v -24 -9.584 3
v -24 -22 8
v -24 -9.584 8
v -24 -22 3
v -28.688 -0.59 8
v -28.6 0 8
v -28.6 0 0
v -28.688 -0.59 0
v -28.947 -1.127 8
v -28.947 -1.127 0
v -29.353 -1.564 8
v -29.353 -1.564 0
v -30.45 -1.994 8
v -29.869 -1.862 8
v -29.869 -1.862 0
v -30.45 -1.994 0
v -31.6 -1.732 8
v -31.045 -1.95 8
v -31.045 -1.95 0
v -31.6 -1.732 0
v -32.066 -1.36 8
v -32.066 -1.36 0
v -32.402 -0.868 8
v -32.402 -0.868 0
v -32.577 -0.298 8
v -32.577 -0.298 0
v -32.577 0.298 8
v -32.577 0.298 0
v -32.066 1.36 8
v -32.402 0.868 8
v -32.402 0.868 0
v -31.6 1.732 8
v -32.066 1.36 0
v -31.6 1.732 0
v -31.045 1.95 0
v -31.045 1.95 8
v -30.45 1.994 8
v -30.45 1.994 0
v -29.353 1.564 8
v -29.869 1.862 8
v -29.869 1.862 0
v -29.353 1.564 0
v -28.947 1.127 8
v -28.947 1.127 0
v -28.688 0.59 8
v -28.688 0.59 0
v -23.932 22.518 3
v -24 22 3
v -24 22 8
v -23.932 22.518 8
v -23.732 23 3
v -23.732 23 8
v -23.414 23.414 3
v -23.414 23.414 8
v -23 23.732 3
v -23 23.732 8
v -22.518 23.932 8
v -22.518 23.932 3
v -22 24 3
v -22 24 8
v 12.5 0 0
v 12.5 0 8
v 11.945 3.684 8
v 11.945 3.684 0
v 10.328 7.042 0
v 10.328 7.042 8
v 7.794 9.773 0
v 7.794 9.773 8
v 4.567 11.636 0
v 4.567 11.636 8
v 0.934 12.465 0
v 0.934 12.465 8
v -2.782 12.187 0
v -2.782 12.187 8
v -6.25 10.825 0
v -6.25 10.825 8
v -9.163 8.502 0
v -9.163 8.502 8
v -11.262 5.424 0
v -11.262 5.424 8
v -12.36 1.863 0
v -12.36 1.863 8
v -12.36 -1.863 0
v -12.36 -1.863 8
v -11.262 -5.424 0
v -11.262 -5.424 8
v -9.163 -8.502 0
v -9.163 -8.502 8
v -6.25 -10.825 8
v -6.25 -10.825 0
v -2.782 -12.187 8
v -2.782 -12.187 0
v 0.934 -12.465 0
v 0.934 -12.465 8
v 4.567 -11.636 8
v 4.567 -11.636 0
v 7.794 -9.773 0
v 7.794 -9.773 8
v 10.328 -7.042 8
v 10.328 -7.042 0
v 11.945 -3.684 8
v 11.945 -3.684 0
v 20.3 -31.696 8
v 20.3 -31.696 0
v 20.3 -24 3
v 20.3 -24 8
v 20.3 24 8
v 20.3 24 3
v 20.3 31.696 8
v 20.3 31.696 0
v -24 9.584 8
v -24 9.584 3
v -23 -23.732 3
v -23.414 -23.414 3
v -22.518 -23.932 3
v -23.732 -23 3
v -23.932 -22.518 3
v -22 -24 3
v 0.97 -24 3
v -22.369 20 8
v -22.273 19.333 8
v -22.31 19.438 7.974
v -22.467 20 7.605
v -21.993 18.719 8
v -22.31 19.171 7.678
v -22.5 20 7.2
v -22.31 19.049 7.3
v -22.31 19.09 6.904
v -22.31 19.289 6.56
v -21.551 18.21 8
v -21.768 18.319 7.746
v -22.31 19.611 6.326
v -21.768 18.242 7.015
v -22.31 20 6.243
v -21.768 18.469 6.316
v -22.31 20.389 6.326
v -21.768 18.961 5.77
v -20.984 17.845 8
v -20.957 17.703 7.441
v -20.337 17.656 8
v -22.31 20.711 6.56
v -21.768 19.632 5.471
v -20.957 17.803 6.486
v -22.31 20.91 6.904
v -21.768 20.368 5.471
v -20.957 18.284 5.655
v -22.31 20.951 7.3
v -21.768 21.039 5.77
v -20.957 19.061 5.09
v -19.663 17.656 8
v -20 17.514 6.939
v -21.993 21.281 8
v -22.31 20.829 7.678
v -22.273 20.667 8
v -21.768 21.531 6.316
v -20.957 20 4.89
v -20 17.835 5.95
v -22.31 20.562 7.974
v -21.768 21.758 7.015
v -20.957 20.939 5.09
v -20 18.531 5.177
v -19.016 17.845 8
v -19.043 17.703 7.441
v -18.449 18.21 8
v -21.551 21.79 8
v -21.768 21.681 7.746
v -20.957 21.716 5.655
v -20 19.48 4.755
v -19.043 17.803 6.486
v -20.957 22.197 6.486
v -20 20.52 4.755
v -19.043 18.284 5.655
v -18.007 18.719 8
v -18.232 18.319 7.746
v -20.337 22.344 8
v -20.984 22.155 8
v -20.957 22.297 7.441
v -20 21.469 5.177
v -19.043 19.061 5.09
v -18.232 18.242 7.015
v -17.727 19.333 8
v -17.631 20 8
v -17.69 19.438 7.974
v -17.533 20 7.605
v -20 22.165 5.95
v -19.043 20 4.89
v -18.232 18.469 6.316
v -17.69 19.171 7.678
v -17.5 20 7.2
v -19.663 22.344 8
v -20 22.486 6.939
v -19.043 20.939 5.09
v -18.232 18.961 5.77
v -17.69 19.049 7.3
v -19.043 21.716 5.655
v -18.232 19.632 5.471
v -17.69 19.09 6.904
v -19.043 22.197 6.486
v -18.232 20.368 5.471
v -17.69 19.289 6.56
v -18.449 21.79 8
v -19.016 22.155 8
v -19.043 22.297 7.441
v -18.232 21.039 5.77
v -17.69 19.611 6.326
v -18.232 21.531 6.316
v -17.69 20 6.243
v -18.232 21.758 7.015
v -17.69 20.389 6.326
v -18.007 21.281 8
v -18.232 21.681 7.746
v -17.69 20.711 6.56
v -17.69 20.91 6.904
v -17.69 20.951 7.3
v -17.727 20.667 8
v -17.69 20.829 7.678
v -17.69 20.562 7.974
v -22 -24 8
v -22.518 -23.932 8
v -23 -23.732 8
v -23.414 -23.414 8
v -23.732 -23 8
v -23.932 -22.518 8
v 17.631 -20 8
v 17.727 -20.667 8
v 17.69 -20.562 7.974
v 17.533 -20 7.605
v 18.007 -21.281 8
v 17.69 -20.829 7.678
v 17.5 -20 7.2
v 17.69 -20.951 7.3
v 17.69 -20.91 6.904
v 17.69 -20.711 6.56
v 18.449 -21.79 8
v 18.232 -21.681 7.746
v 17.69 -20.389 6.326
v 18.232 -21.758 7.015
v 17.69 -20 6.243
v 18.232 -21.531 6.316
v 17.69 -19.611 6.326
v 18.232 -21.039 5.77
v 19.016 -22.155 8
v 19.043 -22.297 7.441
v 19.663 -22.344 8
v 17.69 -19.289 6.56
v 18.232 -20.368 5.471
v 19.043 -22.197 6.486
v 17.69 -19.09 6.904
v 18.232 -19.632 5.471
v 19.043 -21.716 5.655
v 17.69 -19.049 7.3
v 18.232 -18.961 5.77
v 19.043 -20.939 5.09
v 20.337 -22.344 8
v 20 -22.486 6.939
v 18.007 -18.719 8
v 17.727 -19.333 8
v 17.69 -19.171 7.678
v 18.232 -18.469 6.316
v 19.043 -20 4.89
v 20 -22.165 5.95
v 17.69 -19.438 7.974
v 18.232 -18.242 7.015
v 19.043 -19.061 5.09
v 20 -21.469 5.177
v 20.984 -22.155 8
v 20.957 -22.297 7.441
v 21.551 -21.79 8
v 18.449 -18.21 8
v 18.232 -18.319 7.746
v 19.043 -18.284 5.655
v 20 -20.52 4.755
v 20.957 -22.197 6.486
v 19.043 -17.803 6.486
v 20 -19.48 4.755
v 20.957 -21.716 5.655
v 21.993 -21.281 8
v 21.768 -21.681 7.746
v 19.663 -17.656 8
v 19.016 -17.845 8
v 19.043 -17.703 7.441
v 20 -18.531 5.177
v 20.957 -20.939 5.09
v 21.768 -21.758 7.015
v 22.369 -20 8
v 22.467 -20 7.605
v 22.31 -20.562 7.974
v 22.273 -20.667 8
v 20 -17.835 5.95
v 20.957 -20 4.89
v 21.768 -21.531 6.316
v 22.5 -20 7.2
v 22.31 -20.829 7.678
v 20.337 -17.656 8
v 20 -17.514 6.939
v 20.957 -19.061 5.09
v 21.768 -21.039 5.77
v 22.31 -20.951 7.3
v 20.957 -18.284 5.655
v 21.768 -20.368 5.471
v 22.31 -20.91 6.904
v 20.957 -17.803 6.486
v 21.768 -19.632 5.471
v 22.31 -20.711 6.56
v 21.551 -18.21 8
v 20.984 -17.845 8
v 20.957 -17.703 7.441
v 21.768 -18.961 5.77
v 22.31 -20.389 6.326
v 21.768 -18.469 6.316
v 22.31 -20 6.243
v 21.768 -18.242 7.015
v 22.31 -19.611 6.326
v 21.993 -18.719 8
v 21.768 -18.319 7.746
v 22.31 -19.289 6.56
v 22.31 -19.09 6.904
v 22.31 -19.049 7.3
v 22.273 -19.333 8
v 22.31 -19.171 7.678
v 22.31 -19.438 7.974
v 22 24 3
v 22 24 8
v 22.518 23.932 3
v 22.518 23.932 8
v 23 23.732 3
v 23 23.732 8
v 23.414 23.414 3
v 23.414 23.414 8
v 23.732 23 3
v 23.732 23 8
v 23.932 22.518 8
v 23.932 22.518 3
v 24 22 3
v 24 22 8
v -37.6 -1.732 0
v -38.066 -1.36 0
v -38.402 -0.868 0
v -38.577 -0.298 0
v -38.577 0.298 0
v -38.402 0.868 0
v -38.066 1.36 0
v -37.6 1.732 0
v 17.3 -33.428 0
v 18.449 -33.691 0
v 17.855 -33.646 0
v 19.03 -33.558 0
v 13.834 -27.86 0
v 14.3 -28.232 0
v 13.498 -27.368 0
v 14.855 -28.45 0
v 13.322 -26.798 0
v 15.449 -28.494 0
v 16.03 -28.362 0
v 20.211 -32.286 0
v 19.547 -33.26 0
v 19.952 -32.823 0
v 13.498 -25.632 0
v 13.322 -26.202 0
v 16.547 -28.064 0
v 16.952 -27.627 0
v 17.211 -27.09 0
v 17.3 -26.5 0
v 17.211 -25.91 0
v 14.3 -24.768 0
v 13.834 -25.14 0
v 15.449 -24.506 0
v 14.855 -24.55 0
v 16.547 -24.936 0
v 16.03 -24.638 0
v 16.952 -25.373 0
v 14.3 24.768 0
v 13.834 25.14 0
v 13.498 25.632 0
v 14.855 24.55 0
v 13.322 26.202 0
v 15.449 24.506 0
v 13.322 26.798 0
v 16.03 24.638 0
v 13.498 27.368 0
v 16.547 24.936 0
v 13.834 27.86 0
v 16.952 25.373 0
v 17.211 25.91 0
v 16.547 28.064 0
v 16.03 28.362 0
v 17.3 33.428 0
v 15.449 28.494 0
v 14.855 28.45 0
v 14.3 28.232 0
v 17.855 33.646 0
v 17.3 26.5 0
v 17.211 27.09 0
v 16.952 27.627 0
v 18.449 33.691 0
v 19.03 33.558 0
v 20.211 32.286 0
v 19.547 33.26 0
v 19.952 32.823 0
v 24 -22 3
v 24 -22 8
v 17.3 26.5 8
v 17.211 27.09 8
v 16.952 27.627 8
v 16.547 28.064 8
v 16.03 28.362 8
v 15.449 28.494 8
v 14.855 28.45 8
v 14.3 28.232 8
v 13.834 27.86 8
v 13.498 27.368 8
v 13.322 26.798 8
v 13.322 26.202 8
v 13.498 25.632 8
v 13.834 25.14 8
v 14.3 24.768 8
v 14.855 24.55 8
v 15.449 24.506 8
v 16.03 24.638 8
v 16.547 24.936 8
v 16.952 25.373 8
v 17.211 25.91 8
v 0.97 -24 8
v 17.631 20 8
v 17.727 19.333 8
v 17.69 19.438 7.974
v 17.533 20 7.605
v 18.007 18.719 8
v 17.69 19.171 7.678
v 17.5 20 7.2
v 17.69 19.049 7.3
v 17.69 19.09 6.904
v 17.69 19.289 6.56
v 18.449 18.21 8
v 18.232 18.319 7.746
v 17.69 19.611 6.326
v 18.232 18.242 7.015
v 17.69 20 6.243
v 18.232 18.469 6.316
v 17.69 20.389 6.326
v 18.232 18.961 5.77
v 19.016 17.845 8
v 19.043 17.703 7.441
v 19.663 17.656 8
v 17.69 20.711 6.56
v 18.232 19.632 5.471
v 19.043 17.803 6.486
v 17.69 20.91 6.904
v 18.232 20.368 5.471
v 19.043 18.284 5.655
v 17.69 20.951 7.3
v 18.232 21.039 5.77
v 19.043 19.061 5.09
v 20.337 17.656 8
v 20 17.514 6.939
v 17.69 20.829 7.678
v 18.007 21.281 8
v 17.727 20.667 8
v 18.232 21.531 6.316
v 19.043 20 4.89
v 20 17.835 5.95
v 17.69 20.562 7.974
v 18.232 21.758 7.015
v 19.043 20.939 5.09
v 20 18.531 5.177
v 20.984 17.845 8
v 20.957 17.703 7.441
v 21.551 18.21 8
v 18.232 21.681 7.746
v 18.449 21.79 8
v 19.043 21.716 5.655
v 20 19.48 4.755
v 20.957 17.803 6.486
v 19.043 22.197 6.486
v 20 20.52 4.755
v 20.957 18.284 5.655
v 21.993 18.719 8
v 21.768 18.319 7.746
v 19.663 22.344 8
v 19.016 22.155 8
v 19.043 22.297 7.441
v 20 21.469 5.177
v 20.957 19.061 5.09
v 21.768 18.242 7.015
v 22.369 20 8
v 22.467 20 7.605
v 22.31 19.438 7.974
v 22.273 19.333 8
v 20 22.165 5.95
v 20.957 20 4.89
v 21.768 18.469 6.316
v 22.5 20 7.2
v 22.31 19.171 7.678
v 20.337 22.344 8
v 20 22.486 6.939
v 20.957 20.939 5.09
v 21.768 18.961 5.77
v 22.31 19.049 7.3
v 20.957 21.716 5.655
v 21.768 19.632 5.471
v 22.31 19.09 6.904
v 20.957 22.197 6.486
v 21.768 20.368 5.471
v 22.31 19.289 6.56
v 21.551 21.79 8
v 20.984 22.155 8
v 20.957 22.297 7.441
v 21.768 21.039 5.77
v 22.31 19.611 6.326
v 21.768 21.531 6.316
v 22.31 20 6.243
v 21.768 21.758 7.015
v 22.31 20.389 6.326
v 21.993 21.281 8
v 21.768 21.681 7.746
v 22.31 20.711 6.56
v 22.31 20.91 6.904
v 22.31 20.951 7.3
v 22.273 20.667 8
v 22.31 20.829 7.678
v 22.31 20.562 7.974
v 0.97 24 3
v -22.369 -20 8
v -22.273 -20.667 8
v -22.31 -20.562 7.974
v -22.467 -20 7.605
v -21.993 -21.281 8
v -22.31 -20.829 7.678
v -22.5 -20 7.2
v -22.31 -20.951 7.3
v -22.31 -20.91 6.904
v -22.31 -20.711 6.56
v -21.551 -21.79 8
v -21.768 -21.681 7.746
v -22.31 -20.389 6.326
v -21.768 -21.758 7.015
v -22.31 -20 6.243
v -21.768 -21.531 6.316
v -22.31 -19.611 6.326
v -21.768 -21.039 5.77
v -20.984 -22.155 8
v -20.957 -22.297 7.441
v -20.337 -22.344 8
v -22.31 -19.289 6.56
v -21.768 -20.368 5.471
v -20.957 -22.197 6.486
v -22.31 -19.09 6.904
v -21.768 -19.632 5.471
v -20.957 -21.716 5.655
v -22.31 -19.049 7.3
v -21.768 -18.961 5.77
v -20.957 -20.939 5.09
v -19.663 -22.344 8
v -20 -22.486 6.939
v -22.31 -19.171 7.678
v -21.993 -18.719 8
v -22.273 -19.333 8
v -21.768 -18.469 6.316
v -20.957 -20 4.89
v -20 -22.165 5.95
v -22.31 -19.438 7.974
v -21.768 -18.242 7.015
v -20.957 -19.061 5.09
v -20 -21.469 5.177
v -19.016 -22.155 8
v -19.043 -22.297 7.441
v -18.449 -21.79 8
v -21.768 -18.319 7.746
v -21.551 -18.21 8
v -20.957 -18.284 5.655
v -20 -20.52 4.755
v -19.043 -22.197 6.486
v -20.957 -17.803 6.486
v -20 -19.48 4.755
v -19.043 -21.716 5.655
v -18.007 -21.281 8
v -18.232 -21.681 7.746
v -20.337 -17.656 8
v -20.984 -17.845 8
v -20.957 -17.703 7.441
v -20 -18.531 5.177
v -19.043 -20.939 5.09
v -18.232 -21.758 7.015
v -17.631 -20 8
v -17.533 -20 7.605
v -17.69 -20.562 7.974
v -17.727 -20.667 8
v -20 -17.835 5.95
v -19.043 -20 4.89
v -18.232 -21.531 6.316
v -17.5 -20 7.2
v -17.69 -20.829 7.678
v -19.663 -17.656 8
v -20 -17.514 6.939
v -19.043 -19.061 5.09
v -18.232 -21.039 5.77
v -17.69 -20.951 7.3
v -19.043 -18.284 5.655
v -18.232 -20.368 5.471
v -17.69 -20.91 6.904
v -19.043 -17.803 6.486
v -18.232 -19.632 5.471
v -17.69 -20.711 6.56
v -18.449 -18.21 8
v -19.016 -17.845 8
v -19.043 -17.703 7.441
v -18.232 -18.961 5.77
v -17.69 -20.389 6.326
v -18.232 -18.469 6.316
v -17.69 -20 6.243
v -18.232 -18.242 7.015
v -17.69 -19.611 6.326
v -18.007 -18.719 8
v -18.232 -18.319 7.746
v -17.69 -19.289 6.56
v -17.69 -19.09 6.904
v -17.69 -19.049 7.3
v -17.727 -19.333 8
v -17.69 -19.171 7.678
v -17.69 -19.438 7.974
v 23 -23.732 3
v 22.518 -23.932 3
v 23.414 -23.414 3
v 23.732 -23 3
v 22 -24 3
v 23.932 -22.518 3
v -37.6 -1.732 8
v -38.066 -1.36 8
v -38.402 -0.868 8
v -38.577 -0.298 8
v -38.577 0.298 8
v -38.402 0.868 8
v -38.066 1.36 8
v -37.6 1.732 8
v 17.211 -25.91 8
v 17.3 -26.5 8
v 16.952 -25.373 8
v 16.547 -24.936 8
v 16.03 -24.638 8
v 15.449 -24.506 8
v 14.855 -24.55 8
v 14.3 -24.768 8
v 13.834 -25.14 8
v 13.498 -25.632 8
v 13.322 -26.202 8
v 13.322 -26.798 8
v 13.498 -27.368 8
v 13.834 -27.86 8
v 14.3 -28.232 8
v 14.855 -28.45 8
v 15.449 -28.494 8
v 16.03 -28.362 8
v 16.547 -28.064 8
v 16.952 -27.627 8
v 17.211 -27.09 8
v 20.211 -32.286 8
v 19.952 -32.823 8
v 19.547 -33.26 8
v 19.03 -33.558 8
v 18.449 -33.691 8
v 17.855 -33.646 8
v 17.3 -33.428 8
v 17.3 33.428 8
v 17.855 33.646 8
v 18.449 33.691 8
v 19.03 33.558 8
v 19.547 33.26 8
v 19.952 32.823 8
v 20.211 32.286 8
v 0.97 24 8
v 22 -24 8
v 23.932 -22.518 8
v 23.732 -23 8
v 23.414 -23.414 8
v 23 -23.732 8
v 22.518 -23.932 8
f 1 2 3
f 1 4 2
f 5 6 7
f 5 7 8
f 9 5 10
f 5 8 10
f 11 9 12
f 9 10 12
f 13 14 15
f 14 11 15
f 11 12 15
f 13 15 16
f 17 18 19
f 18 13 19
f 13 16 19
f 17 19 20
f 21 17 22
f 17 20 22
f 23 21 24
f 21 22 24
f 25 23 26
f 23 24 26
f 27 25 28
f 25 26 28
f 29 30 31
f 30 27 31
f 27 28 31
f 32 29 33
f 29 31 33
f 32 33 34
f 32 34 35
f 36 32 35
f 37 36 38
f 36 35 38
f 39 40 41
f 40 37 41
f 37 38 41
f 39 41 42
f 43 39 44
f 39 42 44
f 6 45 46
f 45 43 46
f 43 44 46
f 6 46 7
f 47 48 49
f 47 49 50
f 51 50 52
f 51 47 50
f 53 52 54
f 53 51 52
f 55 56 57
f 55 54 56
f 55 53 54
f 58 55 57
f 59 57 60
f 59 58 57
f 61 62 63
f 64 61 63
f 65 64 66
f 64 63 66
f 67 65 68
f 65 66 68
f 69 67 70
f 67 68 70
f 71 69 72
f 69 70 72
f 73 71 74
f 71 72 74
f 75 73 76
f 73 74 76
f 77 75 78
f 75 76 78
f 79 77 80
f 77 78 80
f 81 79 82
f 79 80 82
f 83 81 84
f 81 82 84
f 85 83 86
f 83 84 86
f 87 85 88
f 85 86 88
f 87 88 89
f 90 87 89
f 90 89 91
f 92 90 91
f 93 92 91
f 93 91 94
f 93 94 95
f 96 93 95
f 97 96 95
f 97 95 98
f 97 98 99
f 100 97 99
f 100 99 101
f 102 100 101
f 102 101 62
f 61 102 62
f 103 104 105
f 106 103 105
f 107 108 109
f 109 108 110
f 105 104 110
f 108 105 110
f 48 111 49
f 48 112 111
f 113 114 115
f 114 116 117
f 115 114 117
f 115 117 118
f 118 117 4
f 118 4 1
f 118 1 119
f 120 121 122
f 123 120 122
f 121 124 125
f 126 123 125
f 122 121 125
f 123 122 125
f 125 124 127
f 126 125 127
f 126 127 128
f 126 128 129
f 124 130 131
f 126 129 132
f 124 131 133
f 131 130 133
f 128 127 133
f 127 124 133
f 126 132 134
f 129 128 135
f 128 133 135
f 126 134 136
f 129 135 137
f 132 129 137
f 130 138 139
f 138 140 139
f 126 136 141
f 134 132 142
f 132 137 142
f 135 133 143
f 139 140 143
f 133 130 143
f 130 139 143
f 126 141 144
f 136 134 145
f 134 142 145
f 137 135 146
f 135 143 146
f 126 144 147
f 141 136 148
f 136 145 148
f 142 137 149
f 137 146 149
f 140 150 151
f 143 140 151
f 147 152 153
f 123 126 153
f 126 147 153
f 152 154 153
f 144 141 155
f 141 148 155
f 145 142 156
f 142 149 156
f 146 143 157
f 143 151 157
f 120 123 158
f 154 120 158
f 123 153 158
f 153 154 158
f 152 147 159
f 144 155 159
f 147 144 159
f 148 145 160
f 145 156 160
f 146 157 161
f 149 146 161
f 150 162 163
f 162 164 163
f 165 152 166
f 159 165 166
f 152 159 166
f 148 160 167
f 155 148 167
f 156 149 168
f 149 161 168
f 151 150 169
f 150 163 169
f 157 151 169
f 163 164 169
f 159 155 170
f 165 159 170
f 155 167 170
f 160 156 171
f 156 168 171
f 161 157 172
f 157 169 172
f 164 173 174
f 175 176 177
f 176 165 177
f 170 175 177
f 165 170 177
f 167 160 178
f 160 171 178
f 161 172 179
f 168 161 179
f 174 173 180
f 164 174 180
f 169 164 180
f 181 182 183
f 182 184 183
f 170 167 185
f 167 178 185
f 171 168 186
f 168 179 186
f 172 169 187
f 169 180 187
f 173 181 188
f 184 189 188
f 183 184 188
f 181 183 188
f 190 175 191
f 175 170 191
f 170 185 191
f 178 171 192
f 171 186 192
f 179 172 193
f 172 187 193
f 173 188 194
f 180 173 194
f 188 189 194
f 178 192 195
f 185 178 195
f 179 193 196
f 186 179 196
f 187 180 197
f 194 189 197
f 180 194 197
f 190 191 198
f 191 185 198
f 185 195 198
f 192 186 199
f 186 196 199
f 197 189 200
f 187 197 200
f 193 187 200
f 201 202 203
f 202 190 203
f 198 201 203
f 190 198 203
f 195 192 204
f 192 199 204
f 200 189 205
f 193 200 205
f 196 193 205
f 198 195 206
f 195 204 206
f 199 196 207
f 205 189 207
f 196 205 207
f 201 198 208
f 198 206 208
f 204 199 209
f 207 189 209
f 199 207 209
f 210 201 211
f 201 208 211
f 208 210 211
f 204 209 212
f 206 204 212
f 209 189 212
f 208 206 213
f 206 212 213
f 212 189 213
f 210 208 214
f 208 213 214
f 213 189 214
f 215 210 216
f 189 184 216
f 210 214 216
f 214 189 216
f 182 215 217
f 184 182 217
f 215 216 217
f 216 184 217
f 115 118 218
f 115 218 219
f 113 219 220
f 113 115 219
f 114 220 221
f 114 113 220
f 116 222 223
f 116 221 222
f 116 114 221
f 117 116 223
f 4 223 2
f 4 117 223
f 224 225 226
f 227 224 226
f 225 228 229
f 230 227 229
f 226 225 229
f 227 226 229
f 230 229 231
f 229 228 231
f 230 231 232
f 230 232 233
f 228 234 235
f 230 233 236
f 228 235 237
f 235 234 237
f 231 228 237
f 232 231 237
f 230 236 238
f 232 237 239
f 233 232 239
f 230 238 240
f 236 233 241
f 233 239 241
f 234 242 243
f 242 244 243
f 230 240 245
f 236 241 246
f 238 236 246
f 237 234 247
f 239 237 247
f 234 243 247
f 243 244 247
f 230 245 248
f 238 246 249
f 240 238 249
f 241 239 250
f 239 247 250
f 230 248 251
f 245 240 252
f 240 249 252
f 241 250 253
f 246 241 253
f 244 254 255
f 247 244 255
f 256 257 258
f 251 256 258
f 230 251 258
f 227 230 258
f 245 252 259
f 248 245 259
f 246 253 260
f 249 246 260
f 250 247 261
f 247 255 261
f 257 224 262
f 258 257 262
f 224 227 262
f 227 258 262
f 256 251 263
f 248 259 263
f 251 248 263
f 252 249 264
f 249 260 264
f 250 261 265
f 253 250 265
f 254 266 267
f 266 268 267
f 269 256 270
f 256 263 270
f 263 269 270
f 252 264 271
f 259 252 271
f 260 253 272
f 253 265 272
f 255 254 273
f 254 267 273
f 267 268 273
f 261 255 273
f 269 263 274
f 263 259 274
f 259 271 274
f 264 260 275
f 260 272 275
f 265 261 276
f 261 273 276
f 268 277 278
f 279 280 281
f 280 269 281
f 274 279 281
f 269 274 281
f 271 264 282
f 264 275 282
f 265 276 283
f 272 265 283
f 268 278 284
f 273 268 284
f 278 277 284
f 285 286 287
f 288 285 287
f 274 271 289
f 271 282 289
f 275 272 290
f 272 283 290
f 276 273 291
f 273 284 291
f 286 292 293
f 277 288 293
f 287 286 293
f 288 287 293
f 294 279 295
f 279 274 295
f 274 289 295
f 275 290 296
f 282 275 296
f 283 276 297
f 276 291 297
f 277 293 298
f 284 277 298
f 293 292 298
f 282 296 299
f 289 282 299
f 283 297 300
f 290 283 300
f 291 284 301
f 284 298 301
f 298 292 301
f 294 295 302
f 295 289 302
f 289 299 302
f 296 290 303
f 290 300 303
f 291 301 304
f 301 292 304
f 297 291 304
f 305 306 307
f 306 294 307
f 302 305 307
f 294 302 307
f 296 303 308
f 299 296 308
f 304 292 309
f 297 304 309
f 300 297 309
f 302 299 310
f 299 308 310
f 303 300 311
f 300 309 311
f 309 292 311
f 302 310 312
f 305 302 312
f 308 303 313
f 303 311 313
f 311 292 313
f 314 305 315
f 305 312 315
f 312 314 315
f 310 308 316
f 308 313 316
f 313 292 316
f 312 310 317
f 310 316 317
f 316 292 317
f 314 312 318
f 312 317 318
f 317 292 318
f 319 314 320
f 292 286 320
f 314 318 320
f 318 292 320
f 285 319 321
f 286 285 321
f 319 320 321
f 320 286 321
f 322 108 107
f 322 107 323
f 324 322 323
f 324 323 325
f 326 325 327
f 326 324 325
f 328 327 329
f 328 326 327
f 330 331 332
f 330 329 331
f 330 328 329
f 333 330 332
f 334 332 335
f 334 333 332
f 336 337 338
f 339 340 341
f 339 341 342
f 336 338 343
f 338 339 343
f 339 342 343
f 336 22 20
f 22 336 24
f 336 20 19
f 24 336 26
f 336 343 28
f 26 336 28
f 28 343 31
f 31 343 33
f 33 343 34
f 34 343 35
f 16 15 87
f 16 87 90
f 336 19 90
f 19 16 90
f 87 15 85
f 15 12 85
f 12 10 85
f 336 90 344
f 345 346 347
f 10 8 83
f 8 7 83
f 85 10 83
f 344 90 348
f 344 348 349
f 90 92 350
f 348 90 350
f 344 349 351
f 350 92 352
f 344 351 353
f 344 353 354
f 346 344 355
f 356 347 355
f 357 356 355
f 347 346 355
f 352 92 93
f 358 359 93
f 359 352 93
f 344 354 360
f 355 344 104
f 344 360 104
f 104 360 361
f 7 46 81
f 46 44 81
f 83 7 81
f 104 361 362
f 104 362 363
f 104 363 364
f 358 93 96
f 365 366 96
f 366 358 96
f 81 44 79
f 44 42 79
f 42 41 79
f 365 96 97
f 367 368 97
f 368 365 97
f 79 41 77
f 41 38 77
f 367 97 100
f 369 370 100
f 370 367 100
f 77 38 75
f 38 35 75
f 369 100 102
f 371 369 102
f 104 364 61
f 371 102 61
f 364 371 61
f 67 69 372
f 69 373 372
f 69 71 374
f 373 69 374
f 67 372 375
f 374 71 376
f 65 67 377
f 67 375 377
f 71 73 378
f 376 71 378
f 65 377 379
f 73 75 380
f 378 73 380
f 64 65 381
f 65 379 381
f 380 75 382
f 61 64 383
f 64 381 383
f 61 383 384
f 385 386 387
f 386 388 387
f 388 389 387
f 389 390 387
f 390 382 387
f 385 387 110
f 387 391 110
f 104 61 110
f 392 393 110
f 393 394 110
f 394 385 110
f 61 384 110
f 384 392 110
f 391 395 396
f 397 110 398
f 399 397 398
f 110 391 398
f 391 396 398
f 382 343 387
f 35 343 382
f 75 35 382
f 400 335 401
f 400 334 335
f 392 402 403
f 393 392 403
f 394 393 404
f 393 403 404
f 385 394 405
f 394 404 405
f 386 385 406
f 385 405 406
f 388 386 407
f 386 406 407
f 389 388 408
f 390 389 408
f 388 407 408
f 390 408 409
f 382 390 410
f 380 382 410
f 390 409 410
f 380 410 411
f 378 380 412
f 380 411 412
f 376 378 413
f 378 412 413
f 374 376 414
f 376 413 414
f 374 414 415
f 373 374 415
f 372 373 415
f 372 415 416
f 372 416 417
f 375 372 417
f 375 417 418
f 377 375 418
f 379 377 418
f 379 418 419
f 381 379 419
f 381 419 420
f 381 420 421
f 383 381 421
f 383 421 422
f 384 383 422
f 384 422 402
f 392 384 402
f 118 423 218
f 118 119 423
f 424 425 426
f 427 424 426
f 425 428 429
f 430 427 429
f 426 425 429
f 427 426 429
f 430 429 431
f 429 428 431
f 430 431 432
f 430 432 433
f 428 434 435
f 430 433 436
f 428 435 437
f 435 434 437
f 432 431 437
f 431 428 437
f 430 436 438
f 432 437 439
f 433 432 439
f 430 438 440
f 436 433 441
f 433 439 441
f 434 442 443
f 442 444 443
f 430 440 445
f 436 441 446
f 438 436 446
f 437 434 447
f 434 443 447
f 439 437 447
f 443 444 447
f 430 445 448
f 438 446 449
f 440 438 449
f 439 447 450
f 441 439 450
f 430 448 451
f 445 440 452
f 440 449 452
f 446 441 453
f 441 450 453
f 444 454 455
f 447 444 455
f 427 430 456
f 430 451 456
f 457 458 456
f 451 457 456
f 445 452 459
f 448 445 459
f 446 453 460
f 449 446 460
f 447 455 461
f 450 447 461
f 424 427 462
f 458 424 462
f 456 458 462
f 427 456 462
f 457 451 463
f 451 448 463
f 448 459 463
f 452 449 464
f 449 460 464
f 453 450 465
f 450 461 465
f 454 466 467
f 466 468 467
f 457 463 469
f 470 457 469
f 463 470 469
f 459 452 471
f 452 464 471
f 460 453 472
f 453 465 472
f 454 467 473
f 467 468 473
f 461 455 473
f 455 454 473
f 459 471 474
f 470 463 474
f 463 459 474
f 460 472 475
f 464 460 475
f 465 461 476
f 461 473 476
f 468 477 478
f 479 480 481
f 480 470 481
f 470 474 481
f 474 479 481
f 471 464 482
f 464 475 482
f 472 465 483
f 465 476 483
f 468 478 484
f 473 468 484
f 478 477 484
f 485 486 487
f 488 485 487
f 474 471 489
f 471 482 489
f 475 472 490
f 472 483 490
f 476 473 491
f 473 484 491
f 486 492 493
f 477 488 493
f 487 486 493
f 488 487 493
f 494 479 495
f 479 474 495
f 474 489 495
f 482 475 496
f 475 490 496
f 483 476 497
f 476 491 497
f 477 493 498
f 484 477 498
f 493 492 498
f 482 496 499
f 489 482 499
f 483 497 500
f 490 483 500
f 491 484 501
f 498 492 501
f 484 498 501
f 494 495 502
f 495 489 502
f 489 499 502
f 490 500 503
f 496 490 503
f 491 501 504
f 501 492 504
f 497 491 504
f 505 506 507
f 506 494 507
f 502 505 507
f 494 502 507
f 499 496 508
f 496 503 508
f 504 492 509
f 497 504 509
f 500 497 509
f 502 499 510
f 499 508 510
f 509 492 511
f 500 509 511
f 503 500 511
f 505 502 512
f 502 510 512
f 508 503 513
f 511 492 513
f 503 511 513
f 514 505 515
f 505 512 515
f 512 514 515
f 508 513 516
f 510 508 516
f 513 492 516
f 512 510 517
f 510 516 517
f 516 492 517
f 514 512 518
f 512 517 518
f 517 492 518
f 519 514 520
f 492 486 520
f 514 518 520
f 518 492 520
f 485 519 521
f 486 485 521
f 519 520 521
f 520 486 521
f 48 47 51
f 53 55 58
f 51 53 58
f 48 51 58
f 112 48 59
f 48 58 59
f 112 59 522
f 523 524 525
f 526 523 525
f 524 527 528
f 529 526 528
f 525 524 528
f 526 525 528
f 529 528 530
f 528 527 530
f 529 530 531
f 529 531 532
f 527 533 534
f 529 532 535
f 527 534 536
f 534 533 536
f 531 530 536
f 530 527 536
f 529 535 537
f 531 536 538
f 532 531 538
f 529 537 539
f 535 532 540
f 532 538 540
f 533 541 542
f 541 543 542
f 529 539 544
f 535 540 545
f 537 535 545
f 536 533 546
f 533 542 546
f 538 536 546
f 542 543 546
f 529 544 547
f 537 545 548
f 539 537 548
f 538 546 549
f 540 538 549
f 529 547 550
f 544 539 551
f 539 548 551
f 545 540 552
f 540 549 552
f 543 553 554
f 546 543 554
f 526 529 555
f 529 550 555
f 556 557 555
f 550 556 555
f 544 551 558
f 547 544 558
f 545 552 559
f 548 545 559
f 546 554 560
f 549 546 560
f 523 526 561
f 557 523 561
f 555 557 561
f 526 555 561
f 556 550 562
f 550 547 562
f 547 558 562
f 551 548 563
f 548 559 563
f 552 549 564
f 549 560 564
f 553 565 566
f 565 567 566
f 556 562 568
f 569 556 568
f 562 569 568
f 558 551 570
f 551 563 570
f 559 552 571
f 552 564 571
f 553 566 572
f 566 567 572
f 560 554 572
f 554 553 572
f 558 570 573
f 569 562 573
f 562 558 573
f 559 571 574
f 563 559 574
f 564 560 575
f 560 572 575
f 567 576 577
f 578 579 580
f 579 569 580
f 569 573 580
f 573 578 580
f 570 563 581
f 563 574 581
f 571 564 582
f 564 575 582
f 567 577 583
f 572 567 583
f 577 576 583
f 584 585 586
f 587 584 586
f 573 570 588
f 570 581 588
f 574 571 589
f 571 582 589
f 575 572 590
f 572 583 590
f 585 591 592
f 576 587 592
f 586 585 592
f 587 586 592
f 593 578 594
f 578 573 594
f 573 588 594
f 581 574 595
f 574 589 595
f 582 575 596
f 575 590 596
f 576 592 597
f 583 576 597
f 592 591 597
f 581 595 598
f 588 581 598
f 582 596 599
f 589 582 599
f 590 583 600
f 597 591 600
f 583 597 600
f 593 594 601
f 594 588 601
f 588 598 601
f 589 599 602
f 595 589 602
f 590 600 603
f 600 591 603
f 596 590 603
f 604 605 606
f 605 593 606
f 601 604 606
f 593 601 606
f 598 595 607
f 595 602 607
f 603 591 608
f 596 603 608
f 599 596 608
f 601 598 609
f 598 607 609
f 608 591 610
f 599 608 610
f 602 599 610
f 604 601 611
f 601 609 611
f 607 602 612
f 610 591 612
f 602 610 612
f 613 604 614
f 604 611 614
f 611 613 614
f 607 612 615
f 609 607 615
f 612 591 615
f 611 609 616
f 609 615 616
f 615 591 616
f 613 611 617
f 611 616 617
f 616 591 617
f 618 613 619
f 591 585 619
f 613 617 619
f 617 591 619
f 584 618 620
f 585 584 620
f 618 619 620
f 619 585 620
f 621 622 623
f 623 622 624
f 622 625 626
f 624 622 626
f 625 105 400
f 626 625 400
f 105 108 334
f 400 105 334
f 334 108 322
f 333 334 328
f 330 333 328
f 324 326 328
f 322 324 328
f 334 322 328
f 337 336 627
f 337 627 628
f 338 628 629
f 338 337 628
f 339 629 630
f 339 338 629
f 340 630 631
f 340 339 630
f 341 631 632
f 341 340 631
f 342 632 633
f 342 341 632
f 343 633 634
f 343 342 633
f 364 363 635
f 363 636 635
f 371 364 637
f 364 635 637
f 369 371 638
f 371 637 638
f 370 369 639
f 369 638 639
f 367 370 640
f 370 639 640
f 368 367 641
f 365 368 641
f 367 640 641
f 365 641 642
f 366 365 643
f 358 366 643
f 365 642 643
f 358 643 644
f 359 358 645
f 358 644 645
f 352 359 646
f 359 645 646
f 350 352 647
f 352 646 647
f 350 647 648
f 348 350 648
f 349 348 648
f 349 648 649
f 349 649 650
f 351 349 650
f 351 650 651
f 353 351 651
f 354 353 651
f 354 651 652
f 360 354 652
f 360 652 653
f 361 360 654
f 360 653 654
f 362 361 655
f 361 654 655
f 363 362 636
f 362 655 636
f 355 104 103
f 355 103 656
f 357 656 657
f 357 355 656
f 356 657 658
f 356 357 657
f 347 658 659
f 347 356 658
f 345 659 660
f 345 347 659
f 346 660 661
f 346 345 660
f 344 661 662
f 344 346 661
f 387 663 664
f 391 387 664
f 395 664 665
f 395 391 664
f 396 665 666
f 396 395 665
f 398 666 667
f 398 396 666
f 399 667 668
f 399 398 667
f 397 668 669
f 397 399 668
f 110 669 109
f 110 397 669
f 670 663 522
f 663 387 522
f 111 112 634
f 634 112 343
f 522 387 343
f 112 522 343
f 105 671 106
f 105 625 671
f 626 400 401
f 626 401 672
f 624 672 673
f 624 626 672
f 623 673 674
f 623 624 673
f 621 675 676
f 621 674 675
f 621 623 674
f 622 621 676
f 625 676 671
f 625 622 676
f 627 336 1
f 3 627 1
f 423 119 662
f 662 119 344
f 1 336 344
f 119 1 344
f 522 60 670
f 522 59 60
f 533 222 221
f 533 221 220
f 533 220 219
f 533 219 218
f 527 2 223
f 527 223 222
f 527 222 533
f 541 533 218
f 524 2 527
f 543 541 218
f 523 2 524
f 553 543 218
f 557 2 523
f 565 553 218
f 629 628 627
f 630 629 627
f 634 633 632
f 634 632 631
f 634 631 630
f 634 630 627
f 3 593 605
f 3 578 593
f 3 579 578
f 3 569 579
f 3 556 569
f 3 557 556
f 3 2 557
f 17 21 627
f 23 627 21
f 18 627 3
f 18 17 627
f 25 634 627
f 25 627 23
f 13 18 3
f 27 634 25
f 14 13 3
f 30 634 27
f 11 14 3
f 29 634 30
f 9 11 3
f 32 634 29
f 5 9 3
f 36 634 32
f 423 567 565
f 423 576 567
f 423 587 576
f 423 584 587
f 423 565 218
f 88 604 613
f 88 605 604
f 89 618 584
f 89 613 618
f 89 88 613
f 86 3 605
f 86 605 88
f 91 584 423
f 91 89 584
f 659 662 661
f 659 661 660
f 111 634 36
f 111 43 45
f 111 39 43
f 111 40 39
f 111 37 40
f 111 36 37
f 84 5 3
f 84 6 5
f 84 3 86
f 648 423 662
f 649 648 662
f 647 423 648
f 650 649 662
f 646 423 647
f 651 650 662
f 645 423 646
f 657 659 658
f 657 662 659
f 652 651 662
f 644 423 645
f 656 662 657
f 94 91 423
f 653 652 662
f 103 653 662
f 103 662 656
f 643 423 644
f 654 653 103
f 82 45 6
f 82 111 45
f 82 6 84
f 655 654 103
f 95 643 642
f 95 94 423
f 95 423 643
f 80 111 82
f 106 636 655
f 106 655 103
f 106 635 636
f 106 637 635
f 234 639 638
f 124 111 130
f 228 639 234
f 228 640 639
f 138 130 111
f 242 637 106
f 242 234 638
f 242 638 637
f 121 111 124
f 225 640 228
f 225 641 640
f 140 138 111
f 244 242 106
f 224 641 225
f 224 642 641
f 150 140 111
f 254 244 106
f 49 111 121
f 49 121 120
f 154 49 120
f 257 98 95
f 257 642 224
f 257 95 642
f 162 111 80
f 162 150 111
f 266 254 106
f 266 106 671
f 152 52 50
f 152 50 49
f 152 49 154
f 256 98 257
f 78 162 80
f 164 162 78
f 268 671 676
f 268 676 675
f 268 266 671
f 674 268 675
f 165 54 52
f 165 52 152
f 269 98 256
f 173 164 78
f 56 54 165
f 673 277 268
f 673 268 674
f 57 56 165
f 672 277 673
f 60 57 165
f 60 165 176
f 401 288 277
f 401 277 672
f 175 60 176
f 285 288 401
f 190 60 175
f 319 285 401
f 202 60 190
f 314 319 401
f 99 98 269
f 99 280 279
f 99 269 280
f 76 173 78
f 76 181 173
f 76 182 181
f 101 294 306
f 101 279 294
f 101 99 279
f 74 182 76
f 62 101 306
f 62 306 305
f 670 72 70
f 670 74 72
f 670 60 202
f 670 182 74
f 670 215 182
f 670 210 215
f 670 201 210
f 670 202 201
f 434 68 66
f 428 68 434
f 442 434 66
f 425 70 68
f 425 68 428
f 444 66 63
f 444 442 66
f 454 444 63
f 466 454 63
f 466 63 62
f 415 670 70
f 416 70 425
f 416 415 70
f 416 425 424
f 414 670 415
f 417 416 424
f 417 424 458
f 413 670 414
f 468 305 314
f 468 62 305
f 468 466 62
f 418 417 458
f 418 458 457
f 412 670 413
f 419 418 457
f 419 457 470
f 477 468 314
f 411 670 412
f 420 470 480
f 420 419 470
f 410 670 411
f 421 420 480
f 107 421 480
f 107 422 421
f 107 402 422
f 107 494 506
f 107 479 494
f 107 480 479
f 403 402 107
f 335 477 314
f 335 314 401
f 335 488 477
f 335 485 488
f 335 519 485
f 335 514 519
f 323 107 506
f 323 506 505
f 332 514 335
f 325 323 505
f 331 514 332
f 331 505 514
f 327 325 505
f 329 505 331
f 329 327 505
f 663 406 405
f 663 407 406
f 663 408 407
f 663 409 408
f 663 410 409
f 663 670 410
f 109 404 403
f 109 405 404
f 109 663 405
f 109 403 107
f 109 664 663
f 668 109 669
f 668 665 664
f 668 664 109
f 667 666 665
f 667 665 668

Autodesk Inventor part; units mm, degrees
ref_plane "YZ Plane" through (0, 0, 0) normal (1, 0, 0) x (0, 1, 0)
ref_plane "XZ Plane" through (0, 0, 0) normal (0, 1, 0) x (-1, 0, 0)
ref_plane "XY Plane" through (0, 0, 0) normal (0, 0, 1) x (1, 0, 0)
sketch "Sketch1" plane through (0, 0, 0) normal (0, 0, 1) x (1, 0, 0)
  line L0 (15.2998, 26.5) -> (15.2998, -26.5) construction
  line L1 (15.2998, -26.5) -> (-30.5996, 0) construction
  line L2 (-30.5996, 0) -> (15.2998, 26.5) construction
  line L3 (0, 48.0119) -> (0, -48.0119) projected
  circle A0 centre (0, 0) radius 12.5
  line L4 (24.9, -24.45) -> (-24.9, -24.45) construction
  line L5 (-24.9, -24.45) -> (-24.9, 24.45) construction
  line L6 (-24.9, 24.45) -> (24.9, 24.45) construction
  line L7 (24.9, 24.45) -> (24.9, -24.45) construction
  line L8 (24.9, -24.45) -> (-24.9, 24.45) construction
  line L9 (-24.9, -24.45) -> (24.9, 24.45) construction
  line L10 (20, -20) -> (-20, -20) construction
  line L11 (-20, -20) -> (-20, 20) construction
  line L12 (-20, 20) -> (20, 20) construction
  line L13 (20, 20) -> (20, -20) construction
  line L14 (20, -20) -> (-20, 20) construction
  line L15 (-20, -20) -> (20, 20) construction
  line L16 (-37.5996, -1.7321) -> (17.2998, -33.4282)
  line L17 (20.2998, -31.6962) -> (20.2998, 31.6962)
  line L18 (17.2998, 33.4282) -> (-37.5996, 1.7321)
  arc A1 (-37.5996, 1.7321) -> (-37.5996, -1.7321) centre (-36.5996, 0) ccw
  arc A2 (20.2998, 31.6962) -> (17.2998, 33.4282) centre (18.2998, 31.6962) ccw
  arc A3 (17.2998, -33.4282) -> (20.2998, -31.6962) centre (18.2998, -31.6962) ccw
  circle A4 centre (15.2998, 26.5) radius 2
  circle A5 centre (-30.5996, 0) radius 2
  circle A6 centre (15.2998, -26.5) radius 2
  dimension "d1" = 53
  dimension "d2" = 25
  dimension "d3" = 49.8
  dimension "d4" = 48.9
  dimension "d5" = 40
  dimension "d6" = 40
  dimension "d7" = 5
  dimension "d8" = 2
  dimension "d9" = 4
  dimension "d10" = 4
  dimension "d11" = 4
extrude "Extrusion1" add sketch "Sketch1" along normal blind 3 contours L18 A2 L17 A3 L16 L3 A0 | L3 A0 L16 A1 L18
sketch "Sketch3" plane through (0, 0, 3) normal (0, 0, 1) x (1, 0, 0)
  circle A0 centre (0, 0) radius 12.5 projected
  circle A1 centre (15.2998, -26.5) radius 2 projected
  circle A2 centre (-30.5996, 0) radius 2 projected
  circle A3 centre (15.2998, 26.5) radius 2 projected
  line L0 (-37.5996, -1.7321) -> (17.2998, -33.4282) projected
  arc A4 (17.2998, -33.4282) -> (20.2998, -31.6962) centre (18.2998, -31.6962) ccw projected
  line L1 (20.2998, -31.6962) -> (20.2998, 31.6962) projected
  arc A5 (20.2998, 31.6962) -> (17.2998, 33.4282) centre (18.2998, 31.6962) ccw projected
  line L2 (17.2998, 33.4282) -> (-37.5996, 1.7321) projected
  arc A6 (-37.5996, 1.7321) -> (-37.5996, -1.7321) centre (-36.5996, 0) ccw projected
  line L3 (22, -24) -> (-22, -24)
  line L4 (-24, -22) -> (-24, 22)
  line L5 (-22, 24) -> (22, 24)
  line L6 (24, 22) -> (24, -22)
  line L7 (24, -24) -> (-24, 24) construction
  line L8 (-24, -24) -> (24, 24) construction
  arc A7 (-22, 24) -> (-24, 22) centre (-22, 22) ccw
  arc A8 (-24, -22) -> (-22, -24) centre (-22, -22) ccw
  arc A9 (22, -24) -> (24, -22) centre (22, -22) ccw
  arc A10 (24, 22) -> (22, 24) centre (22, 22) ccw
  line L9 (17.2998, 33.4282) -> (-37.5996, 1.7321) projected
  line L10 (-37.5996, -1.7321) -> (17.2998, -33.4282) projected
  line L11 (20.2998, -31.6962) -> (20.2998, 31.6962) projected
  point P0 (20.2998, 24)
  point P1 (-24, 9.5838)
  point P2 (-24, -9.5838)
  point P3 (0.9697, -24)
  point P4 (20.2998, -24)
  dimension "d14" = 48
  dimension "d15" = 48
  dimension "d16" = 2
extrude "Extrusion2" add sketch "Sketch3" along normal blind 5 contours A0 | A1 | A3 | A6 L2 L4 L0 | L4 L2 L5 L1 L3 L0 | L0 L3 A8 L4 | L3 L1 A4 L0 | L4 A7 L5 L2 | L1 L5 A10 L6 A9 L3 | L2 A5 L1 L5
sketch "Sketch4" plane through (0, 0, 8) normal (0, 0, 1) x (1, 0, 0)
  circle A0 centre (0, 0) radius 12.5 projected
  line L0 (20, -20) -> (-20, -20) construction
  line L1 (-20, -20) -> (-20, 20) construction
  line L2 (-20, 20) -> (20, 20) construction
  line L3 (20, 20) -> (20, -20) construction
  line L4 (20, -20) -> (-20, 20) construction
  line L5 (-20, -20) -> (20, 20) construction
  circle A1 centre (15.2998, 26.5) radius 2 projected
  circle A2 centre (15.2998, -26.5) radius 2 projected
  dimension "d19" = 40
  dimension "d20" = 40
extrude "Extrusion3" cut sketch "Sketch4" against normal through all
ref_plane "Work Plane1" through (-22, 0, 3) normal (0, 1, 0) x (1, 0, 0)
ref_plane "Work Plane2" through (0, -22, 3) normal (-1, 0, 0) x (0, 0, 1)
ref_plane "Work Plane3" through (-22, -20, 3) normal (0, 1, 0) x (1, 0, 0)
sketch "Sketch5" plane through (-22, -20, 3) normal (0, 1, 0) x (1, 0, 0)
  line L0 (22.9697, 0) -> (22.9697, -5) projected
  line L1 (22.9697, 0) -> (0, 0) projected
  line L2 (0, 0) -> (0, -5) projected
  line L3 (22.9697, -5) -> (0, -5) projected
  circle A0 centre (2, -4.2) radius 2.5
  line L4 (22, -11.7547) -> (22, 5.4591) projected
  line L5 (-0.5, -4.2) -> (4.5, -4.2)
  line L6 (0, 0) -> (0, -5) projected
  point P0 (22, 3)
  dimension "d24" = 5
  dimension "d25" = 20
  dimension "d26" = 0.8
revolve "Revolution1" cut sketch "Sketch5" angle 360 about axis through (-22.5, -20, 7.2) along (1, 0, 0) contours A0 L5 L2 L3 | L3 L2 L5 A0
pattern_linear "Rectangular Pattern1" count 2 spacing 40 along (1, 0, 0) count 2 spacing 40 along (0, 1, 0) of "Revolution1"
properties part number "20_Cube_Insert_Openflexure_Deltastage_Adapter"
